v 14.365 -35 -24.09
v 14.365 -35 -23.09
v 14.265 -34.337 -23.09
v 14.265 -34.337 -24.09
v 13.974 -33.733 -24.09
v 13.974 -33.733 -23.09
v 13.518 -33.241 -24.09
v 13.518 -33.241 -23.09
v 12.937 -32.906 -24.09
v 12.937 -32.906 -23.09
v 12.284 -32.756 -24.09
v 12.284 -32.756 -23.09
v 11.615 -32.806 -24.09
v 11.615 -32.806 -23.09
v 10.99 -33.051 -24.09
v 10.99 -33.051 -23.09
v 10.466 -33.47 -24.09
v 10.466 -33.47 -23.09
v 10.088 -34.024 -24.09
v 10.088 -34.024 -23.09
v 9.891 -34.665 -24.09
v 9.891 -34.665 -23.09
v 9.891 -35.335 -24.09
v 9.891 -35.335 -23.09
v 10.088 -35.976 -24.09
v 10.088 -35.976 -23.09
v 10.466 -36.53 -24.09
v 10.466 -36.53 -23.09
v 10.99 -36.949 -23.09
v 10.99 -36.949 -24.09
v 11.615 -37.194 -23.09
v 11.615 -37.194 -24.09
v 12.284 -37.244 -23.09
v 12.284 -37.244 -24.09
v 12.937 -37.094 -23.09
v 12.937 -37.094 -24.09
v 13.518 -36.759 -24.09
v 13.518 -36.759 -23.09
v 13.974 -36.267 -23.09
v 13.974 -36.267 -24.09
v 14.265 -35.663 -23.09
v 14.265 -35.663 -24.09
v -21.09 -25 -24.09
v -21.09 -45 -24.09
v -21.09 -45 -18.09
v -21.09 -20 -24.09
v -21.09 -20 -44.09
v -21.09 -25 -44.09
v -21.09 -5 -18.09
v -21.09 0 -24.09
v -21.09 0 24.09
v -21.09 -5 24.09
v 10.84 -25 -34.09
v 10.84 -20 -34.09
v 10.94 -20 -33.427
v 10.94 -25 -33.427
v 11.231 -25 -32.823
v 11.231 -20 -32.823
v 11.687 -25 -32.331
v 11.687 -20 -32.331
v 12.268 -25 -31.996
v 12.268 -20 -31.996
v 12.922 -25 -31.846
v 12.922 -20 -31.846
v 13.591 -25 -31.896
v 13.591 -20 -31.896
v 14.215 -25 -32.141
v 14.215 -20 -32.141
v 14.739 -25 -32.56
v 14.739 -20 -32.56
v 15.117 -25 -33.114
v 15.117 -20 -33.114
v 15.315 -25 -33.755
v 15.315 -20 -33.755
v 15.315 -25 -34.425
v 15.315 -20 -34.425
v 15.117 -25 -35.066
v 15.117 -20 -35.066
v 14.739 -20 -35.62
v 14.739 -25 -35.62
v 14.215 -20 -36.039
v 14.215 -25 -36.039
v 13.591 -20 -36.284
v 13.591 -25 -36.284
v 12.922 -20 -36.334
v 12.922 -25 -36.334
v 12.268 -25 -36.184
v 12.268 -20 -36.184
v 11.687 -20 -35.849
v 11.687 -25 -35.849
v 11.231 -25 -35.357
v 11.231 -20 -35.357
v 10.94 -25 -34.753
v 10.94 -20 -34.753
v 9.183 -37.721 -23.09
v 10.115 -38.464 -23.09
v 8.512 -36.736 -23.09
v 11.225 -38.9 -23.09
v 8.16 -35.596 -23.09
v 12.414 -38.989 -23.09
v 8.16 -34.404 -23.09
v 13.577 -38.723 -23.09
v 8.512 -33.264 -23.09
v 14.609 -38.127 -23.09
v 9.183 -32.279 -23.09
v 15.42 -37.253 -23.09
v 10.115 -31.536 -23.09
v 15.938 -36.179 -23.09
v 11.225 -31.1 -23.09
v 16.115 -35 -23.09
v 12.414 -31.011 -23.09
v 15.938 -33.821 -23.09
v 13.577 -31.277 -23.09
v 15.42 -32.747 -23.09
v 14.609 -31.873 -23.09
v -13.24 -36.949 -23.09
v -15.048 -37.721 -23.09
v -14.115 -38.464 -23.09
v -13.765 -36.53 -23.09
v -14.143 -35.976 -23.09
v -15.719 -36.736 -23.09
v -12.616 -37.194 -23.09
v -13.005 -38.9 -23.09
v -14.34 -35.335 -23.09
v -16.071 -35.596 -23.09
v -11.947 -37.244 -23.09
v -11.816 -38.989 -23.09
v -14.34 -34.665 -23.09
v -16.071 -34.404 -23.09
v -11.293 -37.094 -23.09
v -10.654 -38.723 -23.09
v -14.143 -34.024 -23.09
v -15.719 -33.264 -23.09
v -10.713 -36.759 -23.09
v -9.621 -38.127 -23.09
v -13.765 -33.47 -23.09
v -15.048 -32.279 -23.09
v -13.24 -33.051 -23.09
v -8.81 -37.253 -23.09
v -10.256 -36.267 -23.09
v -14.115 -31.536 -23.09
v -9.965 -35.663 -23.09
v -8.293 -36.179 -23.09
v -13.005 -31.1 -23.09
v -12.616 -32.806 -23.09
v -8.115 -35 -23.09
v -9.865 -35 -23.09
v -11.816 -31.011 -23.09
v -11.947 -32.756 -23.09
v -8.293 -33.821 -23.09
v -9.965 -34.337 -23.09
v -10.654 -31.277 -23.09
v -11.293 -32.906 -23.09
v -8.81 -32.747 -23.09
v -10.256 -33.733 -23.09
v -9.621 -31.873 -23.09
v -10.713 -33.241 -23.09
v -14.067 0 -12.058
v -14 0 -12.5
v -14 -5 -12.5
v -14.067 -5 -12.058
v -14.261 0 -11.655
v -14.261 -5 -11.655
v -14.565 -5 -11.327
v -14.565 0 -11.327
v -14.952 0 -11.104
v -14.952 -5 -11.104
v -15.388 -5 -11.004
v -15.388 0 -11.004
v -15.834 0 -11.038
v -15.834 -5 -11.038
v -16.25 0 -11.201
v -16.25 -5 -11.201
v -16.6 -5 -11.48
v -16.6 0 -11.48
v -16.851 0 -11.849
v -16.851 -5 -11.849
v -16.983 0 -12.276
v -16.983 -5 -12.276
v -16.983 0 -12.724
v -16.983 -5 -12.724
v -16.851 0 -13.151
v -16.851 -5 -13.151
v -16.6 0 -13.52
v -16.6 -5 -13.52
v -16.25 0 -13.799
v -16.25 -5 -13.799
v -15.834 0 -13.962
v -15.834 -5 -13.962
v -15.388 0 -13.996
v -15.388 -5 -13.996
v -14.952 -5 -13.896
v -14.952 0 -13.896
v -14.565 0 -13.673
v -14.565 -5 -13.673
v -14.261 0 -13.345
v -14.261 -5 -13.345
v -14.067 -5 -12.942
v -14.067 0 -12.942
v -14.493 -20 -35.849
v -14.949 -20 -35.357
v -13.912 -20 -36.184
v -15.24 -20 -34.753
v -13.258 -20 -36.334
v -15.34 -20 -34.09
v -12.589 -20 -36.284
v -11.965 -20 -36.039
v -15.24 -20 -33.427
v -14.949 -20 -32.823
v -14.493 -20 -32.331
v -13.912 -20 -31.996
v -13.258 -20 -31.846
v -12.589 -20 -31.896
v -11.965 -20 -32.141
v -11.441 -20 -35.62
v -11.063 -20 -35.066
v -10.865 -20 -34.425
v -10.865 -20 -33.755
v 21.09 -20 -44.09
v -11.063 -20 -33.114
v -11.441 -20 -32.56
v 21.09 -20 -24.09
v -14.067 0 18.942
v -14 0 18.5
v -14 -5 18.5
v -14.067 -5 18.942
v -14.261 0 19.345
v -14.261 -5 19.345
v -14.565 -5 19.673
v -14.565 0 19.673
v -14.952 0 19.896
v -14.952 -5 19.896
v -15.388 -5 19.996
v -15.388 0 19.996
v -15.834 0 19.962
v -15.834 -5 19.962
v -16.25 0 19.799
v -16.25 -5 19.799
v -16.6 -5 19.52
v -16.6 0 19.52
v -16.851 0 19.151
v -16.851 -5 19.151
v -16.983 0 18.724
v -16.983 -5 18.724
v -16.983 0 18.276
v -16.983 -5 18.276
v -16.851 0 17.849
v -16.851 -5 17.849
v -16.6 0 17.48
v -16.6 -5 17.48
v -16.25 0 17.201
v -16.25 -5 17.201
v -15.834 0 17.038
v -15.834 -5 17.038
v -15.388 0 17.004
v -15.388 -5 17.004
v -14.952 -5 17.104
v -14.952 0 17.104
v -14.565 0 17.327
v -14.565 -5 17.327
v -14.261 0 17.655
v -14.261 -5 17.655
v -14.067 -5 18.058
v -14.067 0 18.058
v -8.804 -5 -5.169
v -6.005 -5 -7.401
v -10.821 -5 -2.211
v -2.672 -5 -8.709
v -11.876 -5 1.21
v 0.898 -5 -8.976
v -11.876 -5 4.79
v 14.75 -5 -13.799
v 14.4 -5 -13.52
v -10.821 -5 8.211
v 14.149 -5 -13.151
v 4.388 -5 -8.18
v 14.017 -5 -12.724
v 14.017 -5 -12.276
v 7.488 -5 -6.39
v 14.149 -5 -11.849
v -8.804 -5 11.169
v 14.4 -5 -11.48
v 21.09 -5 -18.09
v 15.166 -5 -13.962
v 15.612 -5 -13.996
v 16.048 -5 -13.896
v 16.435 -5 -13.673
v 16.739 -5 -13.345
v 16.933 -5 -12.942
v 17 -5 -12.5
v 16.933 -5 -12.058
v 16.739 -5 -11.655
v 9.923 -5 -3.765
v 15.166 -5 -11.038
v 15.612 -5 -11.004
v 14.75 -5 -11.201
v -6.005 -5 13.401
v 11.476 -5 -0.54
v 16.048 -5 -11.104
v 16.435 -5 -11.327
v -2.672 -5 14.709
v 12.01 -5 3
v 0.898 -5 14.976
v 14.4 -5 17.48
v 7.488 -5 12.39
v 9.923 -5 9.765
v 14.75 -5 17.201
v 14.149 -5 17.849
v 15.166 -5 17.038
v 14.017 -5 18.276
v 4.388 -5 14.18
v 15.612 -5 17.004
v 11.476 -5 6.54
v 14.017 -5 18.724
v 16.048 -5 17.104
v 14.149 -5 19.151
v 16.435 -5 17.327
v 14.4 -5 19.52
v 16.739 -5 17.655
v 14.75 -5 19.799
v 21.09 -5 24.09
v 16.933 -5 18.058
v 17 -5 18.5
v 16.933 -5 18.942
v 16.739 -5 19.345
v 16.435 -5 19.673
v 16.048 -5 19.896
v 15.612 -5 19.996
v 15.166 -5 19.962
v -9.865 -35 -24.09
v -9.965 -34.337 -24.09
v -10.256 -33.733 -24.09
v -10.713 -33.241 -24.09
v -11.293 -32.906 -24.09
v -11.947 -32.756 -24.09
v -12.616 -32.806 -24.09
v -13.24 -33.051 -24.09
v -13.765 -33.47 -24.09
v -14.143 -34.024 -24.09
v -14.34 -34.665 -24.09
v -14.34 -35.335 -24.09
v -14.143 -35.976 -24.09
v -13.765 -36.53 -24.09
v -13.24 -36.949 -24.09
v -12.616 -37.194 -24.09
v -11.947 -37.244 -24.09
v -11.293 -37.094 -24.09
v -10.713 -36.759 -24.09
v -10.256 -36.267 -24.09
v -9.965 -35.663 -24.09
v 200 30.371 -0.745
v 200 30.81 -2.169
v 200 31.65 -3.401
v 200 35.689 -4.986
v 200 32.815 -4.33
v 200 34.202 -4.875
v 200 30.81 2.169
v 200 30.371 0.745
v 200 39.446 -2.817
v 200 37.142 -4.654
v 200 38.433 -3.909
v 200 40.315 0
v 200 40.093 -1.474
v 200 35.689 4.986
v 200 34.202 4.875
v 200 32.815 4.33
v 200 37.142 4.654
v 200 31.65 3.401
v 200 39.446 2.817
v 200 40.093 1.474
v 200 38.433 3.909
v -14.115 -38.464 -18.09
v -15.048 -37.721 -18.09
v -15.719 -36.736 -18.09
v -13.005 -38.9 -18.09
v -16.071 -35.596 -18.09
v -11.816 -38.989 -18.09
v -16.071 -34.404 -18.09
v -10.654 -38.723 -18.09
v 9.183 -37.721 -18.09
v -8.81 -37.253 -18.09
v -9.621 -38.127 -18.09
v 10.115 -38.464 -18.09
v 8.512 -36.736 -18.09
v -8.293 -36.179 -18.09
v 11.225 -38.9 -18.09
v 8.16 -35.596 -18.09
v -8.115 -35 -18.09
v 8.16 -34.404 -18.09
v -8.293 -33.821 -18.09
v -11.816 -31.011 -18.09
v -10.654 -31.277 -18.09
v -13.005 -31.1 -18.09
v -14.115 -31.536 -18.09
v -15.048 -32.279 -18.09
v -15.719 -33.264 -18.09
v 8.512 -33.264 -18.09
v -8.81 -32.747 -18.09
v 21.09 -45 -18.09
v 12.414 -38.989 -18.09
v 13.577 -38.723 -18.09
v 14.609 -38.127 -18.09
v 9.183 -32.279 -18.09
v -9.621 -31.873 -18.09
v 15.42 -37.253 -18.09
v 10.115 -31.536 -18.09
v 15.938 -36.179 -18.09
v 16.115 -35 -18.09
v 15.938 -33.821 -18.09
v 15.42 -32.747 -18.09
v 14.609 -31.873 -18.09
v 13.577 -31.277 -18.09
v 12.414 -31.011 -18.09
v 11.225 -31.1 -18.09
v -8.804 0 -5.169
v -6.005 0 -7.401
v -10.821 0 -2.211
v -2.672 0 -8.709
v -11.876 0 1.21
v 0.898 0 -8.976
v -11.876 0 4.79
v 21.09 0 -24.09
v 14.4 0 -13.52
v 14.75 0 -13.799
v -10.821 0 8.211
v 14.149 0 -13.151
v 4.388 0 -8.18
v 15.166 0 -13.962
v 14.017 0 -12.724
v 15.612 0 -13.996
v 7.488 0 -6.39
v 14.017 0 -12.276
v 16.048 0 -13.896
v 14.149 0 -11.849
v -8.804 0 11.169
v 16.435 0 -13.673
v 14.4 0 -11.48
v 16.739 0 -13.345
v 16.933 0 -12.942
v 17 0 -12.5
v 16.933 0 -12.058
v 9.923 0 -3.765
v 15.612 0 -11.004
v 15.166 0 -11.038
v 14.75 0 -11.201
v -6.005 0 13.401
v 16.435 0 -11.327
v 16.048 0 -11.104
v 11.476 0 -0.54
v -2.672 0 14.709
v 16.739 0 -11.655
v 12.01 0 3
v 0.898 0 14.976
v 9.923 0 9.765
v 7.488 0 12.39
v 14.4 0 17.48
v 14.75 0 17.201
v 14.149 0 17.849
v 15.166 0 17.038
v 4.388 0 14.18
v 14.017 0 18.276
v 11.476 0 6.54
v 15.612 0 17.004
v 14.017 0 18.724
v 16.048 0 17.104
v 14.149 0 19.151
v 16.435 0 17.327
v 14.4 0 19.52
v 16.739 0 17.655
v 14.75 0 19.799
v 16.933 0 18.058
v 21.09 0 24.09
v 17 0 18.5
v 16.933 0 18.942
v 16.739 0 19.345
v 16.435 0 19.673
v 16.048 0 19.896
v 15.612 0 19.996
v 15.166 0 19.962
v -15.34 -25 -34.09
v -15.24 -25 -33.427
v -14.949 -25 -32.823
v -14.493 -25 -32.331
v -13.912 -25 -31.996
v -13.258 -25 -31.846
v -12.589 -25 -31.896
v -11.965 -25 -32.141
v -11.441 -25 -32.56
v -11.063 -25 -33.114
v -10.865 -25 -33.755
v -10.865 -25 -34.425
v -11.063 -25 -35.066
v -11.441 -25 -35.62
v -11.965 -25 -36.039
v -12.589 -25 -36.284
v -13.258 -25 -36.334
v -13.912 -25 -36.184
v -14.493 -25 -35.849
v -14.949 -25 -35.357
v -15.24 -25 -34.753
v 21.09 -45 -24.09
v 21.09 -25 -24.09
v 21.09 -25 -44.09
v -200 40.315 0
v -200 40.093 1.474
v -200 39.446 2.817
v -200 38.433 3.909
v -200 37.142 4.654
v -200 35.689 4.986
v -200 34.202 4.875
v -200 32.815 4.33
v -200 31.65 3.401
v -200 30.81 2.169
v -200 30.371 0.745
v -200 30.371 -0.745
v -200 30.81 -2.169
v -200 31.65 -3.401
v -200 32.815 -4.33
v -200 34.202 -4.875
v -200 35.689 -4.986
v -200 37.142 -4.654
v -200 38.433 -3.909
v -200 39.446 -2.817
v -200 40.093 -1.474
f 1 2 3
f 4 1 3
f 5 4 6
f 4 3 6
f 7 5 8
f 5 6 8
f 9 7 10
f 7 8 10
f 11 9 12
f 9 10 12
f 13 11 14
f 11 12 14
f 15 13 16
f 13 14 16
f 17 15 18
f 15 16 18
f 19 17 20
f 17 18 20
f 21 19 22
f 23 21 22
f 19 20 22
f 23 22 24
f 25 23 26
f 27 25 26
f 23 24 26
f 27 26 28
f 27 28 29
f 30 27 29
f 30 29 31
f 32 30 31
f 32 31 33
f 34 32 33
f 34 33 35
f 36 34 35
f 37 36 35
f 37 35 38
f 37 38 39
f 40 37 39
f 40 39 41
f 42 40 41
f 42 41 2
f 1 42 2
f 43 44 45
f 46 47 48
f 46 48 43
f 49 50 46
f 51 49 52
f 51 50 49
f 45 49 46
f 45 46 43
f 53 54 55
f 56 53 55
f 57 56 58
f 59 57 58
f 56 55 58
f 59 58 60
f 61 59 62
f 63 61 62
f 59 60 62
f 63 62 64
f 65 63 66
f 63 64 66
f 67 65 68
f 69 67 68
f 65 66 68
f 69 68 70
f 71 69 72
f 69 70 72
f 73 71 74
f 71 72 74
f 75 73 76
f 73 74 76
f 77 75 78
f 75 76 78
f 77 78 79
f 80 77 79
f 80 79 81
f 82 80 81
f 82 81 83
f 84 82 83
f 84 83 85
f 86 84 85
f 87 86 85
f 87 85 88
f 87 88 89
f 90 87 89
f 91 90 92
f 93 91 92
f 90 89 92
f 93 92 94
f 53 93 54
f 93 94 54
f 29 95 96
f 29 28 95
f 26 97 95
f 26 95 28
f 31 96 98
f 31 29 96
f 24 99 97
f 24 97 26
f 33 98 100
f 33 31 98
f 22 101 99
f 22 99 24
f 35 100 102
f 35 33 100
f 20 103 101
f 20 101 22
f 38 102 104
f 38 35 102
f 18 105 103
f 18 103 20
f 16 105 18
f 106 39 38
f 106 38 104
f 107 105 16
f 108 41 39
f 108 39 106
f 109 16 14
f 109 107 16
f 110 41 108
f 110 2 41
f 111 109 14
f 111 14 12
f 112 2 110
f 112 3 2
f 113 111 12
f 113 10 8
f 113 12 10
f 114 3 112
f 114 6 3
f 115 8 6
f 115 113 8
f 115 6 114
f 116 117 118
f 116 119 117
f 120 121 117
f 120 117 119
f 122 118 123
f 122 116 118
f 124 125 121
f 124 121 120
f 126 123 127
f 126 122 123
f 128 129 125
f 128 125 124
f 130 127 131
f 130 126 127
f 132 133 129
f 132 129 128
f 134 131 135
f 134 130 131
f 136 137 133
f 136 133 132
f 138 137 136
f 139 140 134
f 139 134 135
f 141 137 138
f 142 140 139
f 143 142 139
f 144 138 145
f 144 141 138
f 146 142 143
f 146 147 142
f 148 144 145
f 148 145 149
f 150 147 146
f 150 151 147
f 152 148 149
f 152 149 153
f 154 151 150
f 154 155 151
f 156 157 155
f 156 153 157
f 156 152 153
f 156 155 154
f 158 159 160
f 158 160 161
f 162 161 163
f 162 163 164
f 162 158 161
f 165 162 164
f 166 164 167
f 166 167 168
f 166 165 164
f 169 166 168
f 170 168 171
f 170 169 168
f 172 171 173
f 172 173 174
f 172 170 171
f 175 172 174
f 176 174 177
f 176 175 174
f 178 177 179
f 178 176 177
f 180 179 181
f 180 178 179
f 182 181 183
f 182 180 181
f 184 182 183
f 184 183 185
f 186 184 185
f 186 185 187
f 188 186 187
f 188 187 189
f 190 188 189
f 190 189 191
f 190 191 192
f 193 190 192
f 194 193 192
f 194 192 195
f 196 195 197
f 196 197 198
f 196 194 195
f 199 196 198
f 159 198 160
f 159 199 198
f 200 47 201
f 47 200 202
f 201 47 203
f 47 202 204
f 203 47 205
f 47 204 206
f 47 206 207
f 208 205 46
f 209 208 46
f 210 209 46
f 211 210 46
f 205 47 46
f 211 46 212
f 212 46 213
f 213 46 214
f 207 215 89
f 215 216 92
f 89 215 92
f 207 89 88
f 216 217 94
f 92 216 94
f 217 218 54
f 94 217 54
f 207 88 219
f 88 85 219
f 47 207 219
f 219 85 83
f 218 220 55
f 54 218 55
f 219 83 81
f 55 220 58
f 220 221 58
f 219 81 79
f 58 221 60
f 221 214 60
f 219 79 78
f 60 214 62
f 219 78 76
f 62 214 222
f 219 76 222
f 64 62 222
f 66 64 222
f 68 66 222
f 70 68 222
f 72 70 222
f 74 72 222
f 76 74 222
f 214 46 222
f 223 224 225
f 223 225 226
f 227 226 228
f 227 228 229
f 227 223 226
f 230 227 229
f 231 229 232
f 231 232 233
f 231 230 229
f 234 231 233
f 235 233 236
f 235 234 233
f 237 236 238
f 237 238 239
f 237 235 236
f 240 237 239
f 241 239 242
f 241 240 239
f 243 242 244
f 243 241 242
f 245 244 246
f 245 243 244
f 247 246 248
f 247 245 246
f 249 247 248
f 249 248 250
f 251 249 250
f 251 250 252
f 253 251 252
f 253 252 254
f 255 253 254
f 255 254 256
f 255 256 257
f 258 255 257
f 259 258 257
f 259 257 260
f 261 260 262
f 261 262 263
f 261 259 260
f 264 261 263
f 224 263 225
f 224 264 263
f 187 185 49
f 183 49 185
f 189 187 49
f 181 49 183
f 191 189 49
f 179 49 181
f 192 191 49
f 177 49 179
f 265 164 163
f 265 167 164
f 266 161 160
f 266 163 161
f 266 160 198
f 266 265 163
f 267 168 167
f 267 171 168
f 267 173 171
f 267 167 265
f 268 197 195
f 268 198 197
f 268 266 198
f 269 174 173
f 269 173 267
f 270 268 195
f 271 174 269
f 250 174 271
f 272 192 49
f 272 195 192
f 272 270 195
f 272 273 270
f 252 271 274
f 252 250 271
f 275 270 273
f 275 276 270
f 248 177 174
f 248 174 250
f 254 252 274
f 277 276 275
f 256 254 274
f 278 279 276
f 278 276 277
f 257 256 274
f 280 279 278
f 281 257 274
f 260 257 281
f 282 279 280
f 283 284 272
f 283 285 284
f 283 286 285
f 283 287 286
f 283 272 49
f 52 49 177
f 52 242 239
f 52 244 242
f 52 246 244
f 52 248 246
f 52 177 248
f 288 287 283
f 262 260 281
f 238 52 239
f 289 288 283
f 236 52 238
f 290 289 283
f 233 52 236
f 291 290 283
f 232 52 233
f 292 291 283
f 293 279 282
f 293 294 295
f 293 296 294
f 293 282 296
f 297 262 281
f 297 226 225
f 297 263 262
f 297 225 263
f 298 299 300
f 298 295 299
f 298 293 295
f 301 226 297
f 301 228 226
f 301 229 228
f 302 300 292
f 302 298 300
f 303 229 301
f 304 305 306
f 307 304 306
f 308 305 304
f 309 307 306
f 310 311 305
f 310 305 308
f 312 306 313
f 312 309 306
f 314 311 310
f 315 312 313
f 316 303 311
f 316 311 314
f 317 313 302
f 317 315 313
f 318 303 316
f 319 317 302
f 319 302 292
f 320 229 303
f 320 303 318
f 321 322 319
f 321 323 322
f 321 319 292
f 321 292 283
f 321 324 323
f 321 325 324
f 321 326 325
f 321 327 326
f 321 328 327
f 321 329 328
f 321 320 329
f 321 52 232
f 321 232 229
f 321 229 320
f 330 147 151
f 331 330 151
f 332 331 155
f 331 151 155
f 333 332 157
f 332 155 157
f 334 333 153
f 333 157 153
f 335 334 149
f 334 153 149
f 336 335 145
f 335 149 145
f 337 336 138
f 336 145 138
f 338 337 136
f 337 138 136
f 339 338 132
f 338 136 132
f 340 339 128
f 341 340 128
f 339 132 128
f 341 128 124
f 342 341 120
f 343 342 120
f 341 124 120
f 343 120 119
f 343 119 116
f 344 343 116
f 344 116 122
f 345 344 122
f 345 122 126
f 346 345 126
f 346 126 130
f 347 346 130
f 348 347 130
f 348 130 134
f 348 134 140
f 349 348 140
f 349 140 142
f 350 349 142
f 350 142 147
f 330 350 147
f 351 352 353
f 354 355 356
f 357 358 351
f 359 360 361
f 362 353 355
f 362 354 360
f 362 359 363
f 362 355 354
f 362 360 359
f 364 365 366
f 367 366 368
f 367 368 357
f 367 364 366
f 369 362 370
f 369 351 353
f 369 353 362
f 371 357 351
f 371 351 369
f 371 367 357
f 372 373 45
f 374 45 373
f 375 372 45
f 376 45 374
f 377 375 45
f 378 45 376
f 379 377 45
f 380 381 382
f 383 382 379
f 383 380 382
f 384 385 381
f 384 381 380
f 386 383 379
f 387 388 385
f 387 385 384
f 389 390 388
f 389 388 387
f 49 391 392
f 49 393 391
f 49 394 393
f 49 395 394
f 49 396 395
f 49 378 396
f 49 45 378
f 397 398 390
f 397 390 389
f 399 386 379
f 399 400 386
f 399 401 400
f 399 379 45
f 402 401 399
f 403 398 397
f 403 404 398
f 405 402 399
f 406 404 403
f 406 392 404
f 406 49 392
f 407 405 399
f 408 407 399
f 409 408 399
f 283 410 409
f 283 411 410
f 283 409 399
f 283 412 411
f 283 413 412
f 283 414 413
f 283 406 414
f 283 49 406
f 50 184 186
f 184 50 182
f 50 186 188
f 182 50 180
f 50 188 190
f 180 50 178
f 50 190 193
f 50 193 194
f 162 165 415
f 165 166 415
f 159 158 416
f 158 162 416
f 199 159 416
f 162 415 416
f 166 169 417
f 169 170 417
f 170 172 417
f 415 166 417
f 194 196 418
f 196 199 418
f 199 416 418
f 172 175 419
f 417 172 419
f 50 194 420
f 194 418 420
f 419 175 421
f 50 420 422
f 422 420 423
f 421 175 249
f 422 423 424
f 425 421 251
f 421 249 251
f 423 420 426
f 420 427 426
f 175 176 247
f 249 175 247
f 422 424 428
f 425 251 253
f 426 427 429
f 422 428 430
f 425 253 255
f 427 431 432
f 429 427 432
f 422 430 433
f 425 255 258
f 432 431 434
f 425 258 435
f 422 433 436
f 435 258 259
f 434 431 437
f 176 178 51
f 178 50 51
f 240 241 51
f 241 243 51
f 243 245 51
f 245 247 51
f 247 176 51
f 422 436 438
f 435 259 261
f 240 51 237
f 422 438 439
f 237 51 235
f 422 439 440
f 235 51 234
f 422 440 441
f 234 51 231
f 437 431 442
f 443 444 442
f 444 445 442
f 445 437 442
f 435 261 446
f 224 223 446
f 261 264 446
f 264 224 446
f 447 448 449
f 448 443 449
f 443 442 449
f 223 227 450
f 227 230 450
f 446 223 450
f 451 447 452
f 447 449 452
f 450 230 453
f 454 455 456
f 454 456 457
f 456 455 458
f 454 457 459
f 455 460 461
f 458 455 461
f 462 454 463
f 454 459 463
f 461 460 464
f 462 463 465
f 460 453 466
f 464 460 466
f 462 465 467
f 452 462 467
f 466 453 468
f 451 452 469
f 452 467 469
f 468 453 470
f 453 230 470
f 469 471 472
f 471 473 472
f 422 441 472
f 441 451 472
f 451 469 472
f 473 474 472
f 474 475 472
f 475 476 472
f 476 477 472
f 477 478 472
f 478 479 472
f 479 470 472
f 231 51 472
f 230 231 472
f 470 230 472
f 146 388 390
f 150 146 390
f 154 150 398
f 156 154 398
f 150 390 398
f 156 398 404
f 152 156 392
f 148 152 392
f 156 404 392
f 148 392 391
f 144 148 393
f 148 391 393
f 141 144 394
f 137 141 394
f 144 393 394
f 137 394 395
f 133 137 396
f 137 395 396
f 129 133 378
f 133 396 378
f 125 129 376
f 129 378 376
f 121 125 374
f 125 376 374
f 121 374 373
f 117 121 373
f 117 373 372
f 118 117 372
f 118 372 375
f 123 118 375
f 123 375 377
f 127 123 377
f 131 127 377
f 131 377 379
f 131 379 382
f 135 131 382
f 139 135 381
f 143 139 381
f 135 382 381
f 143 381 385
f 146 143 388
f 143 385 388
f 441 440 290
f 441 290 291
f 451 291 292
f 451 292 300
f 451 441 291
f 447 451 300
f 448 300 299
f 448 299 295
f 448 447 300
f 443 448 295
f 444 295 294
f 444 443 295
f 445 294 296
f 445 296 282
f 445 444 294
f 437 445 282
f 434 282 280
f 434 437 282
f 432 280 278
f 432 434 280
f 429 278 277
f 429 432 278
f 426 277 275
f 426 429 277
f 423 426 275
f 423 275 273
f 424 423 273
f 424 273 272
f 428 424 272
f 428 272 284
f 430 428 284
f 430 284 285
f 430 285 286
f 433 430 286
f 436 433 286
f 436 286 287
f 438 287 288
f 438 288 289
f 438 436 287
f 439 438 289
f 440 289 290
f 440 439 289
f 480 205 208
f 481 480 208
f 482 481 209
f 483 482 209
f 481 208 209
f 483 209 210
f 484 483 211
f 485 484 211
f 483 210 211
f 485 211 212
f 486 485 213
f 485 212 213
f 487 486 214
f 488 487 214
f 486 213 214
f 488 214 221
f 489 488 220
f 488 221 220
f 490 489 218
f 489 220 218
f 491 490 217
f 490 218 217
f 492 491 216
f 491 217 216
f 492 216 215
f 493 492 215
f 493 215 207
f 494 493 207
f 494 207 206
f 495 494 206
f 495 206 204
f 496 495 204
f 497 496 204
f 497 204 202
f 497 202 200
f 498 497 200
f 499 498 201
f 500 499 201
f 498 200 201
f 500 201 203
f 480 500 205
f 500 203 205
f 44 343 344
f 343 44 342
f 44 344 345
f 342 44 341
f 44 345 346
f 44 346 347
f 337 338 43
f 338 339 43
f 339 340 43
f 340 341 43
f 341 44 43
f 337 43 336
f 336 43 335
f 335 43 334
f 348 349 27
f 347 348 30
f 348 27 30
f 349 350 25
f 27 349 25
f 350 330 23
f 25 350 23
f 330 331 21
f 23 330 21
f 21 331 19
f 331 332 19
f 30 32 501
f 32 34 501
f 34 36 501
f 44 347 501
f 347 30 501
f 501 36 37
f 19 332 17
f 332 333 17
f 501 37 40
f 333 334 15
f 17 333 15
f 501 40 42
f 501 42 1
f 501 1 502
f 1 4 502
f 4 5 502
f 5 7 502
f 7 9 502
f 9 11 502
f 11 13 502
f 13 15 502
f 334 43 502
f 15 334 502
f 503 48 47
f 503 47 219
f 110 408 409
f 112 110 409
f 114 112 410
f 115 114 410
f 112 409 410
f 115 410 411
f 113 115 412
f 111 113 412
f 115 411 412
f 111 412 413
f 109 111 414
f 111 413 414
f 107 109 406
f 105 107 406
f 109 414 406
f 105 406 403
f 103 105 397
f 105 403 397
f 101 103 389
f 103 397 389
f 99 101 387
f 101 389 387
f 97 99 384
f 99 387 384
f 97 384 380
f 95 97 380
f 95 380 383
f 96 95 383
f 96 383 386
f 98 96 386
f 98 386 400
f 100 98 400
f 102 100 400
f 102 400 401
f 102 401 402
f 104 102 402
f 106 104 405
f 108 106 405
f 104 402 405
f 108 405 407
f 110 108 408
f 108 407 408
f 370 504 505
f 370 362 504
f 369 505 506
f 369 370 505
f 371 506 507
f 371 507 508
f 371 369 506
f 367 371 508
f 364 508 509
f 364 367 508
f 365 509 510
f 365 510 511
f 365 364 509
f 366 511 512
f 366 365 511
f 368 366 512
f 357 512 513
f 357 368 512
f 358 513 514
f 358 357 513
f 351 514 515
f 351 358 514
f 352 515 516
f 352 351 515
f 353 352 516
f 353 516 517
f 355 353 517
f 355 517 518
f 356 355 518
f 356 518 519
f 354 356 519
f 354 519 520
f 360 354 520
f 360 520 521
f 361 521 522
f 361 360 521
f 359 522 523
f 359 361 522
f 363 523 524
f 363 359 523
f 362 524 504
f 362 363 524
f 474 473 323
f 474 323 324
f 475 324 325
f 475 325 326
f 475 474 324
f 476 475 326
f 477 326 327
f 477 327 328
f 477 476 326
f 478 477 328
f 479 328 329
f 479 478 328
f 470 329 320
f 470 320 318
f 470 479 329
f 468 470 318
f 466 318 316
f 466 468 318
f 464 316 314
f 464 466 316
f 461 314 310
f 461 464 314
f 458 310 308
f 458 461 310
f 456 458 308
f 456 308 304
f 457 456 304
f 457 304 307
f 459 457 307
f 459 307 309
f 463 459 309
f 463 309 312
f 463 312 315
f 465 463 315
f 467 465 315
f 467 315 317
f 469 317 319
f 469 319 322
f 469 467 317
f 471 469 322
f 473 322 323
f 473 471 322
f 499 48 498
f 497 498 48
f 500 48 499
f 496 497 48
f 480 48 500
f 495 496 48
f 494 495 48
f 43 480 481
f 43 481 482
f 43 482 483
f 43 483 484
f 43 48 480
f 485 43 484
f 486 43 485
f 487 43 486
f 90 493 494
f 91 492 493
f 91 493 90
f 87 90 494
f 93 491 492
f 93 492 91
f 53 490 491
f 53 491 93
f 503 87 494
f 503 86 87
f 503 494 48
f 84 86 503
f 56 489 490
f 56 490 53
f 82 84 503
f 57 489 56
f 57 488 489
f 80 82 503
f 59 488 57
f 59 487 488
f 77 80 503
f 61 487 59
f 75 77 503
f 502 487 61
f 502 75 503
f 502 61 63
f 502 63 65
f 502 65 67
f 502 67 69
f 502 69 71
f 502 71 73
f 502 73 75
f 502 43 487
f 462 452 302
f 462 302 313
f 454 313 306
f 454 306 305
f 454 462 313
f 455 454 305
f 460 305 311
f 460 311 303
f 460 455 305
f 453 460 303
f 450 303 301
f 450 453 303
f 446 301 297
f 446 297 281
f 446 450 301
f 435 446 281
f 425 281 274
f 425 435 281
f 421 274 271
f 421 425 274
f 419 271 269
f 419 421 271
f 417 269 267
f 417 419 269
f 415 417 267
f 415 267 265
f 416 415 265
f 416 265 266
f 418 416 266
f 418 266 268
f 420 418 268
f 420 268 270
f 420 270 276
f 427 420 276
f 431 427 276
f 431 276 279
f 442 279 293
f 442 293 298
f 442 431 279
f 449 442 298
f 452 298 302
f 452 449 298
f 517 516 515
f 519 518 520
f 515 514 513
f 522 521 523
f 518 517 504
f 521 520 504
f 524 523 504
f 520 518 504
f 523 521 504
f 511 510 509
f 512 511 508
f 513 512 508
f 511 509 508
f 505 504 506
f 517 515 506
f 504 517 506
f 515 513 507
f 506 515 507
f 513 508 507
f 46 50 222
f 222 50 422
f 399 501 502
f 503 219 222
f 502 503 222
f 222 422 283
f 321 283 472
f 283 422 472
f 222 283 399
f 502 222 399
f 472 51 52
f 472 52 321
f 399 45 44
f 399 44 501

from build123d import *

# Parameters (mm, degrees)
F0_W      = 42.18
F0_H      = 6
F0_H_2    = 42.18
F0_R      = 1.5
F0_R_2    = 12.01
F1_DEPTH  = 5
F2_W      = 42.18
F2_H      = 6
F3_DEPTH  = 40
F4_R      = 2.25
F5_DEPTH  = 6
F6_R      = 4
F6_R_2    = 2.25
F7_DEPTH  = 5
F8_W      = 42.18
F8_H      = 5
F9_DEPTH  = 20
F10_R     = 2.25
F11_DEPTH = 5
F12_R     = 5
F13_DEPTH = 200


# Not quite as in the source:
# - a feature names something its author has since deleted; it is built from what else it names


with BuildPart() as f1:
    # F0 (on Front) → F1 (new body)
    with BuildSketch(Plane.XZ):
        with Locations((0, -21.09)):
            Rectangle(F0_W, F0_H)
        with Locations((0, 3)):
            Rectangle(F0_W, F0_H_2)
        with Locations((-15.5, -12.5)):
            Circle(F0_R, mode=Mode.SUBTRACT)
        with Locations((15.5, -12.5)):
            Circle(F0_R, mode=Mode.SUBTRACT)
        with Locations((-15.5, 18.5)):
            Circle(F0_R, mode=Mode.SUBTRACT)
        with Locations((0, 3)):
            Circle(F0_R_2, mode=Mode.SUBTRACT)
        with Locations((15.5, 18.5)):
            Circle(F0_R, mode=Mode.SUBTRACT)
    extrude(amount=F1_DEPTH)

    # F2 (on face) → F3 (join)
    with BuildSketch(Plane.XZ.offset(5)):
        with Locations((0, -21.09)):
            Rectangle(F2_W, F2_H)
    extrude(amount=F3_DEPTH)

    # F4 (on face) → F5 (cut, through all)
    with BuildSketch(Plane.XY.offset(-18.09)):
        with Locations((-12.115384452, -35)):
            Circle(F4_R)
        with Locations((12.115384452, -35)):
            Circle(F4_R)
    extrude(amount=-F5_DEPTH, mode=Mode.SUBTRACT)

    # F6 (on face) → F7 (cut)
    with BuildSketch(Plane.XY.offset(-18.09)):
        with Locations((-12.115384452, -35)):
            Circle(F6_R)
        with Locations((-12.115384452, -35)):
            Circle(F6_R_2, mode=Mode.SUBTRACT)
        with Locations((12.115384452, -35)):
            Circle(F6_R)
        with Locations((12.115384452, -35)):
            Circle(F6_R_2, mode=Mode.SUBTRACT)
    extrude(amount=-F7_DEPTH, mode=Mode.SUBTRACT)

    # F8 (on face) → F9 (join)
    with BuildSketch(Plane(origin=(0, 0, -24.09), x_dir=(1, 0, 0), z_dir=(0, 0, -1))):
        with Locations((0, 22.5)):
            Rectangle(F8_W, F8_H)
    extrude(amount=F9_DEPTH)

    # F10 (on face) → F11 (cut, through all)
    with BuildSketch(Plane(origin=(0, -20, 0), x_dir=(-1, 0, 0), z_dir=(0, 1, 0))):
        with Locations((13.09, -34.09)):
            Circle(F10_R)
        with Locations((-13.09, -34.09)):
            Circle(F10_R)
    extrude(amount=-F11_DEPTH, mode=Mode.SUBTRACT)


with BuildPart() as f13:
    # F12 (on Right) → F13 (new body, symmetric)
    with BuildSketch(Plane.YZ):
        with Locations((35.3150554001, 0)):
            Circle(F12_R)
    extrude(amount=F13_DEPTH, both=True)


solid = Compound([f1.part, f13.part])
